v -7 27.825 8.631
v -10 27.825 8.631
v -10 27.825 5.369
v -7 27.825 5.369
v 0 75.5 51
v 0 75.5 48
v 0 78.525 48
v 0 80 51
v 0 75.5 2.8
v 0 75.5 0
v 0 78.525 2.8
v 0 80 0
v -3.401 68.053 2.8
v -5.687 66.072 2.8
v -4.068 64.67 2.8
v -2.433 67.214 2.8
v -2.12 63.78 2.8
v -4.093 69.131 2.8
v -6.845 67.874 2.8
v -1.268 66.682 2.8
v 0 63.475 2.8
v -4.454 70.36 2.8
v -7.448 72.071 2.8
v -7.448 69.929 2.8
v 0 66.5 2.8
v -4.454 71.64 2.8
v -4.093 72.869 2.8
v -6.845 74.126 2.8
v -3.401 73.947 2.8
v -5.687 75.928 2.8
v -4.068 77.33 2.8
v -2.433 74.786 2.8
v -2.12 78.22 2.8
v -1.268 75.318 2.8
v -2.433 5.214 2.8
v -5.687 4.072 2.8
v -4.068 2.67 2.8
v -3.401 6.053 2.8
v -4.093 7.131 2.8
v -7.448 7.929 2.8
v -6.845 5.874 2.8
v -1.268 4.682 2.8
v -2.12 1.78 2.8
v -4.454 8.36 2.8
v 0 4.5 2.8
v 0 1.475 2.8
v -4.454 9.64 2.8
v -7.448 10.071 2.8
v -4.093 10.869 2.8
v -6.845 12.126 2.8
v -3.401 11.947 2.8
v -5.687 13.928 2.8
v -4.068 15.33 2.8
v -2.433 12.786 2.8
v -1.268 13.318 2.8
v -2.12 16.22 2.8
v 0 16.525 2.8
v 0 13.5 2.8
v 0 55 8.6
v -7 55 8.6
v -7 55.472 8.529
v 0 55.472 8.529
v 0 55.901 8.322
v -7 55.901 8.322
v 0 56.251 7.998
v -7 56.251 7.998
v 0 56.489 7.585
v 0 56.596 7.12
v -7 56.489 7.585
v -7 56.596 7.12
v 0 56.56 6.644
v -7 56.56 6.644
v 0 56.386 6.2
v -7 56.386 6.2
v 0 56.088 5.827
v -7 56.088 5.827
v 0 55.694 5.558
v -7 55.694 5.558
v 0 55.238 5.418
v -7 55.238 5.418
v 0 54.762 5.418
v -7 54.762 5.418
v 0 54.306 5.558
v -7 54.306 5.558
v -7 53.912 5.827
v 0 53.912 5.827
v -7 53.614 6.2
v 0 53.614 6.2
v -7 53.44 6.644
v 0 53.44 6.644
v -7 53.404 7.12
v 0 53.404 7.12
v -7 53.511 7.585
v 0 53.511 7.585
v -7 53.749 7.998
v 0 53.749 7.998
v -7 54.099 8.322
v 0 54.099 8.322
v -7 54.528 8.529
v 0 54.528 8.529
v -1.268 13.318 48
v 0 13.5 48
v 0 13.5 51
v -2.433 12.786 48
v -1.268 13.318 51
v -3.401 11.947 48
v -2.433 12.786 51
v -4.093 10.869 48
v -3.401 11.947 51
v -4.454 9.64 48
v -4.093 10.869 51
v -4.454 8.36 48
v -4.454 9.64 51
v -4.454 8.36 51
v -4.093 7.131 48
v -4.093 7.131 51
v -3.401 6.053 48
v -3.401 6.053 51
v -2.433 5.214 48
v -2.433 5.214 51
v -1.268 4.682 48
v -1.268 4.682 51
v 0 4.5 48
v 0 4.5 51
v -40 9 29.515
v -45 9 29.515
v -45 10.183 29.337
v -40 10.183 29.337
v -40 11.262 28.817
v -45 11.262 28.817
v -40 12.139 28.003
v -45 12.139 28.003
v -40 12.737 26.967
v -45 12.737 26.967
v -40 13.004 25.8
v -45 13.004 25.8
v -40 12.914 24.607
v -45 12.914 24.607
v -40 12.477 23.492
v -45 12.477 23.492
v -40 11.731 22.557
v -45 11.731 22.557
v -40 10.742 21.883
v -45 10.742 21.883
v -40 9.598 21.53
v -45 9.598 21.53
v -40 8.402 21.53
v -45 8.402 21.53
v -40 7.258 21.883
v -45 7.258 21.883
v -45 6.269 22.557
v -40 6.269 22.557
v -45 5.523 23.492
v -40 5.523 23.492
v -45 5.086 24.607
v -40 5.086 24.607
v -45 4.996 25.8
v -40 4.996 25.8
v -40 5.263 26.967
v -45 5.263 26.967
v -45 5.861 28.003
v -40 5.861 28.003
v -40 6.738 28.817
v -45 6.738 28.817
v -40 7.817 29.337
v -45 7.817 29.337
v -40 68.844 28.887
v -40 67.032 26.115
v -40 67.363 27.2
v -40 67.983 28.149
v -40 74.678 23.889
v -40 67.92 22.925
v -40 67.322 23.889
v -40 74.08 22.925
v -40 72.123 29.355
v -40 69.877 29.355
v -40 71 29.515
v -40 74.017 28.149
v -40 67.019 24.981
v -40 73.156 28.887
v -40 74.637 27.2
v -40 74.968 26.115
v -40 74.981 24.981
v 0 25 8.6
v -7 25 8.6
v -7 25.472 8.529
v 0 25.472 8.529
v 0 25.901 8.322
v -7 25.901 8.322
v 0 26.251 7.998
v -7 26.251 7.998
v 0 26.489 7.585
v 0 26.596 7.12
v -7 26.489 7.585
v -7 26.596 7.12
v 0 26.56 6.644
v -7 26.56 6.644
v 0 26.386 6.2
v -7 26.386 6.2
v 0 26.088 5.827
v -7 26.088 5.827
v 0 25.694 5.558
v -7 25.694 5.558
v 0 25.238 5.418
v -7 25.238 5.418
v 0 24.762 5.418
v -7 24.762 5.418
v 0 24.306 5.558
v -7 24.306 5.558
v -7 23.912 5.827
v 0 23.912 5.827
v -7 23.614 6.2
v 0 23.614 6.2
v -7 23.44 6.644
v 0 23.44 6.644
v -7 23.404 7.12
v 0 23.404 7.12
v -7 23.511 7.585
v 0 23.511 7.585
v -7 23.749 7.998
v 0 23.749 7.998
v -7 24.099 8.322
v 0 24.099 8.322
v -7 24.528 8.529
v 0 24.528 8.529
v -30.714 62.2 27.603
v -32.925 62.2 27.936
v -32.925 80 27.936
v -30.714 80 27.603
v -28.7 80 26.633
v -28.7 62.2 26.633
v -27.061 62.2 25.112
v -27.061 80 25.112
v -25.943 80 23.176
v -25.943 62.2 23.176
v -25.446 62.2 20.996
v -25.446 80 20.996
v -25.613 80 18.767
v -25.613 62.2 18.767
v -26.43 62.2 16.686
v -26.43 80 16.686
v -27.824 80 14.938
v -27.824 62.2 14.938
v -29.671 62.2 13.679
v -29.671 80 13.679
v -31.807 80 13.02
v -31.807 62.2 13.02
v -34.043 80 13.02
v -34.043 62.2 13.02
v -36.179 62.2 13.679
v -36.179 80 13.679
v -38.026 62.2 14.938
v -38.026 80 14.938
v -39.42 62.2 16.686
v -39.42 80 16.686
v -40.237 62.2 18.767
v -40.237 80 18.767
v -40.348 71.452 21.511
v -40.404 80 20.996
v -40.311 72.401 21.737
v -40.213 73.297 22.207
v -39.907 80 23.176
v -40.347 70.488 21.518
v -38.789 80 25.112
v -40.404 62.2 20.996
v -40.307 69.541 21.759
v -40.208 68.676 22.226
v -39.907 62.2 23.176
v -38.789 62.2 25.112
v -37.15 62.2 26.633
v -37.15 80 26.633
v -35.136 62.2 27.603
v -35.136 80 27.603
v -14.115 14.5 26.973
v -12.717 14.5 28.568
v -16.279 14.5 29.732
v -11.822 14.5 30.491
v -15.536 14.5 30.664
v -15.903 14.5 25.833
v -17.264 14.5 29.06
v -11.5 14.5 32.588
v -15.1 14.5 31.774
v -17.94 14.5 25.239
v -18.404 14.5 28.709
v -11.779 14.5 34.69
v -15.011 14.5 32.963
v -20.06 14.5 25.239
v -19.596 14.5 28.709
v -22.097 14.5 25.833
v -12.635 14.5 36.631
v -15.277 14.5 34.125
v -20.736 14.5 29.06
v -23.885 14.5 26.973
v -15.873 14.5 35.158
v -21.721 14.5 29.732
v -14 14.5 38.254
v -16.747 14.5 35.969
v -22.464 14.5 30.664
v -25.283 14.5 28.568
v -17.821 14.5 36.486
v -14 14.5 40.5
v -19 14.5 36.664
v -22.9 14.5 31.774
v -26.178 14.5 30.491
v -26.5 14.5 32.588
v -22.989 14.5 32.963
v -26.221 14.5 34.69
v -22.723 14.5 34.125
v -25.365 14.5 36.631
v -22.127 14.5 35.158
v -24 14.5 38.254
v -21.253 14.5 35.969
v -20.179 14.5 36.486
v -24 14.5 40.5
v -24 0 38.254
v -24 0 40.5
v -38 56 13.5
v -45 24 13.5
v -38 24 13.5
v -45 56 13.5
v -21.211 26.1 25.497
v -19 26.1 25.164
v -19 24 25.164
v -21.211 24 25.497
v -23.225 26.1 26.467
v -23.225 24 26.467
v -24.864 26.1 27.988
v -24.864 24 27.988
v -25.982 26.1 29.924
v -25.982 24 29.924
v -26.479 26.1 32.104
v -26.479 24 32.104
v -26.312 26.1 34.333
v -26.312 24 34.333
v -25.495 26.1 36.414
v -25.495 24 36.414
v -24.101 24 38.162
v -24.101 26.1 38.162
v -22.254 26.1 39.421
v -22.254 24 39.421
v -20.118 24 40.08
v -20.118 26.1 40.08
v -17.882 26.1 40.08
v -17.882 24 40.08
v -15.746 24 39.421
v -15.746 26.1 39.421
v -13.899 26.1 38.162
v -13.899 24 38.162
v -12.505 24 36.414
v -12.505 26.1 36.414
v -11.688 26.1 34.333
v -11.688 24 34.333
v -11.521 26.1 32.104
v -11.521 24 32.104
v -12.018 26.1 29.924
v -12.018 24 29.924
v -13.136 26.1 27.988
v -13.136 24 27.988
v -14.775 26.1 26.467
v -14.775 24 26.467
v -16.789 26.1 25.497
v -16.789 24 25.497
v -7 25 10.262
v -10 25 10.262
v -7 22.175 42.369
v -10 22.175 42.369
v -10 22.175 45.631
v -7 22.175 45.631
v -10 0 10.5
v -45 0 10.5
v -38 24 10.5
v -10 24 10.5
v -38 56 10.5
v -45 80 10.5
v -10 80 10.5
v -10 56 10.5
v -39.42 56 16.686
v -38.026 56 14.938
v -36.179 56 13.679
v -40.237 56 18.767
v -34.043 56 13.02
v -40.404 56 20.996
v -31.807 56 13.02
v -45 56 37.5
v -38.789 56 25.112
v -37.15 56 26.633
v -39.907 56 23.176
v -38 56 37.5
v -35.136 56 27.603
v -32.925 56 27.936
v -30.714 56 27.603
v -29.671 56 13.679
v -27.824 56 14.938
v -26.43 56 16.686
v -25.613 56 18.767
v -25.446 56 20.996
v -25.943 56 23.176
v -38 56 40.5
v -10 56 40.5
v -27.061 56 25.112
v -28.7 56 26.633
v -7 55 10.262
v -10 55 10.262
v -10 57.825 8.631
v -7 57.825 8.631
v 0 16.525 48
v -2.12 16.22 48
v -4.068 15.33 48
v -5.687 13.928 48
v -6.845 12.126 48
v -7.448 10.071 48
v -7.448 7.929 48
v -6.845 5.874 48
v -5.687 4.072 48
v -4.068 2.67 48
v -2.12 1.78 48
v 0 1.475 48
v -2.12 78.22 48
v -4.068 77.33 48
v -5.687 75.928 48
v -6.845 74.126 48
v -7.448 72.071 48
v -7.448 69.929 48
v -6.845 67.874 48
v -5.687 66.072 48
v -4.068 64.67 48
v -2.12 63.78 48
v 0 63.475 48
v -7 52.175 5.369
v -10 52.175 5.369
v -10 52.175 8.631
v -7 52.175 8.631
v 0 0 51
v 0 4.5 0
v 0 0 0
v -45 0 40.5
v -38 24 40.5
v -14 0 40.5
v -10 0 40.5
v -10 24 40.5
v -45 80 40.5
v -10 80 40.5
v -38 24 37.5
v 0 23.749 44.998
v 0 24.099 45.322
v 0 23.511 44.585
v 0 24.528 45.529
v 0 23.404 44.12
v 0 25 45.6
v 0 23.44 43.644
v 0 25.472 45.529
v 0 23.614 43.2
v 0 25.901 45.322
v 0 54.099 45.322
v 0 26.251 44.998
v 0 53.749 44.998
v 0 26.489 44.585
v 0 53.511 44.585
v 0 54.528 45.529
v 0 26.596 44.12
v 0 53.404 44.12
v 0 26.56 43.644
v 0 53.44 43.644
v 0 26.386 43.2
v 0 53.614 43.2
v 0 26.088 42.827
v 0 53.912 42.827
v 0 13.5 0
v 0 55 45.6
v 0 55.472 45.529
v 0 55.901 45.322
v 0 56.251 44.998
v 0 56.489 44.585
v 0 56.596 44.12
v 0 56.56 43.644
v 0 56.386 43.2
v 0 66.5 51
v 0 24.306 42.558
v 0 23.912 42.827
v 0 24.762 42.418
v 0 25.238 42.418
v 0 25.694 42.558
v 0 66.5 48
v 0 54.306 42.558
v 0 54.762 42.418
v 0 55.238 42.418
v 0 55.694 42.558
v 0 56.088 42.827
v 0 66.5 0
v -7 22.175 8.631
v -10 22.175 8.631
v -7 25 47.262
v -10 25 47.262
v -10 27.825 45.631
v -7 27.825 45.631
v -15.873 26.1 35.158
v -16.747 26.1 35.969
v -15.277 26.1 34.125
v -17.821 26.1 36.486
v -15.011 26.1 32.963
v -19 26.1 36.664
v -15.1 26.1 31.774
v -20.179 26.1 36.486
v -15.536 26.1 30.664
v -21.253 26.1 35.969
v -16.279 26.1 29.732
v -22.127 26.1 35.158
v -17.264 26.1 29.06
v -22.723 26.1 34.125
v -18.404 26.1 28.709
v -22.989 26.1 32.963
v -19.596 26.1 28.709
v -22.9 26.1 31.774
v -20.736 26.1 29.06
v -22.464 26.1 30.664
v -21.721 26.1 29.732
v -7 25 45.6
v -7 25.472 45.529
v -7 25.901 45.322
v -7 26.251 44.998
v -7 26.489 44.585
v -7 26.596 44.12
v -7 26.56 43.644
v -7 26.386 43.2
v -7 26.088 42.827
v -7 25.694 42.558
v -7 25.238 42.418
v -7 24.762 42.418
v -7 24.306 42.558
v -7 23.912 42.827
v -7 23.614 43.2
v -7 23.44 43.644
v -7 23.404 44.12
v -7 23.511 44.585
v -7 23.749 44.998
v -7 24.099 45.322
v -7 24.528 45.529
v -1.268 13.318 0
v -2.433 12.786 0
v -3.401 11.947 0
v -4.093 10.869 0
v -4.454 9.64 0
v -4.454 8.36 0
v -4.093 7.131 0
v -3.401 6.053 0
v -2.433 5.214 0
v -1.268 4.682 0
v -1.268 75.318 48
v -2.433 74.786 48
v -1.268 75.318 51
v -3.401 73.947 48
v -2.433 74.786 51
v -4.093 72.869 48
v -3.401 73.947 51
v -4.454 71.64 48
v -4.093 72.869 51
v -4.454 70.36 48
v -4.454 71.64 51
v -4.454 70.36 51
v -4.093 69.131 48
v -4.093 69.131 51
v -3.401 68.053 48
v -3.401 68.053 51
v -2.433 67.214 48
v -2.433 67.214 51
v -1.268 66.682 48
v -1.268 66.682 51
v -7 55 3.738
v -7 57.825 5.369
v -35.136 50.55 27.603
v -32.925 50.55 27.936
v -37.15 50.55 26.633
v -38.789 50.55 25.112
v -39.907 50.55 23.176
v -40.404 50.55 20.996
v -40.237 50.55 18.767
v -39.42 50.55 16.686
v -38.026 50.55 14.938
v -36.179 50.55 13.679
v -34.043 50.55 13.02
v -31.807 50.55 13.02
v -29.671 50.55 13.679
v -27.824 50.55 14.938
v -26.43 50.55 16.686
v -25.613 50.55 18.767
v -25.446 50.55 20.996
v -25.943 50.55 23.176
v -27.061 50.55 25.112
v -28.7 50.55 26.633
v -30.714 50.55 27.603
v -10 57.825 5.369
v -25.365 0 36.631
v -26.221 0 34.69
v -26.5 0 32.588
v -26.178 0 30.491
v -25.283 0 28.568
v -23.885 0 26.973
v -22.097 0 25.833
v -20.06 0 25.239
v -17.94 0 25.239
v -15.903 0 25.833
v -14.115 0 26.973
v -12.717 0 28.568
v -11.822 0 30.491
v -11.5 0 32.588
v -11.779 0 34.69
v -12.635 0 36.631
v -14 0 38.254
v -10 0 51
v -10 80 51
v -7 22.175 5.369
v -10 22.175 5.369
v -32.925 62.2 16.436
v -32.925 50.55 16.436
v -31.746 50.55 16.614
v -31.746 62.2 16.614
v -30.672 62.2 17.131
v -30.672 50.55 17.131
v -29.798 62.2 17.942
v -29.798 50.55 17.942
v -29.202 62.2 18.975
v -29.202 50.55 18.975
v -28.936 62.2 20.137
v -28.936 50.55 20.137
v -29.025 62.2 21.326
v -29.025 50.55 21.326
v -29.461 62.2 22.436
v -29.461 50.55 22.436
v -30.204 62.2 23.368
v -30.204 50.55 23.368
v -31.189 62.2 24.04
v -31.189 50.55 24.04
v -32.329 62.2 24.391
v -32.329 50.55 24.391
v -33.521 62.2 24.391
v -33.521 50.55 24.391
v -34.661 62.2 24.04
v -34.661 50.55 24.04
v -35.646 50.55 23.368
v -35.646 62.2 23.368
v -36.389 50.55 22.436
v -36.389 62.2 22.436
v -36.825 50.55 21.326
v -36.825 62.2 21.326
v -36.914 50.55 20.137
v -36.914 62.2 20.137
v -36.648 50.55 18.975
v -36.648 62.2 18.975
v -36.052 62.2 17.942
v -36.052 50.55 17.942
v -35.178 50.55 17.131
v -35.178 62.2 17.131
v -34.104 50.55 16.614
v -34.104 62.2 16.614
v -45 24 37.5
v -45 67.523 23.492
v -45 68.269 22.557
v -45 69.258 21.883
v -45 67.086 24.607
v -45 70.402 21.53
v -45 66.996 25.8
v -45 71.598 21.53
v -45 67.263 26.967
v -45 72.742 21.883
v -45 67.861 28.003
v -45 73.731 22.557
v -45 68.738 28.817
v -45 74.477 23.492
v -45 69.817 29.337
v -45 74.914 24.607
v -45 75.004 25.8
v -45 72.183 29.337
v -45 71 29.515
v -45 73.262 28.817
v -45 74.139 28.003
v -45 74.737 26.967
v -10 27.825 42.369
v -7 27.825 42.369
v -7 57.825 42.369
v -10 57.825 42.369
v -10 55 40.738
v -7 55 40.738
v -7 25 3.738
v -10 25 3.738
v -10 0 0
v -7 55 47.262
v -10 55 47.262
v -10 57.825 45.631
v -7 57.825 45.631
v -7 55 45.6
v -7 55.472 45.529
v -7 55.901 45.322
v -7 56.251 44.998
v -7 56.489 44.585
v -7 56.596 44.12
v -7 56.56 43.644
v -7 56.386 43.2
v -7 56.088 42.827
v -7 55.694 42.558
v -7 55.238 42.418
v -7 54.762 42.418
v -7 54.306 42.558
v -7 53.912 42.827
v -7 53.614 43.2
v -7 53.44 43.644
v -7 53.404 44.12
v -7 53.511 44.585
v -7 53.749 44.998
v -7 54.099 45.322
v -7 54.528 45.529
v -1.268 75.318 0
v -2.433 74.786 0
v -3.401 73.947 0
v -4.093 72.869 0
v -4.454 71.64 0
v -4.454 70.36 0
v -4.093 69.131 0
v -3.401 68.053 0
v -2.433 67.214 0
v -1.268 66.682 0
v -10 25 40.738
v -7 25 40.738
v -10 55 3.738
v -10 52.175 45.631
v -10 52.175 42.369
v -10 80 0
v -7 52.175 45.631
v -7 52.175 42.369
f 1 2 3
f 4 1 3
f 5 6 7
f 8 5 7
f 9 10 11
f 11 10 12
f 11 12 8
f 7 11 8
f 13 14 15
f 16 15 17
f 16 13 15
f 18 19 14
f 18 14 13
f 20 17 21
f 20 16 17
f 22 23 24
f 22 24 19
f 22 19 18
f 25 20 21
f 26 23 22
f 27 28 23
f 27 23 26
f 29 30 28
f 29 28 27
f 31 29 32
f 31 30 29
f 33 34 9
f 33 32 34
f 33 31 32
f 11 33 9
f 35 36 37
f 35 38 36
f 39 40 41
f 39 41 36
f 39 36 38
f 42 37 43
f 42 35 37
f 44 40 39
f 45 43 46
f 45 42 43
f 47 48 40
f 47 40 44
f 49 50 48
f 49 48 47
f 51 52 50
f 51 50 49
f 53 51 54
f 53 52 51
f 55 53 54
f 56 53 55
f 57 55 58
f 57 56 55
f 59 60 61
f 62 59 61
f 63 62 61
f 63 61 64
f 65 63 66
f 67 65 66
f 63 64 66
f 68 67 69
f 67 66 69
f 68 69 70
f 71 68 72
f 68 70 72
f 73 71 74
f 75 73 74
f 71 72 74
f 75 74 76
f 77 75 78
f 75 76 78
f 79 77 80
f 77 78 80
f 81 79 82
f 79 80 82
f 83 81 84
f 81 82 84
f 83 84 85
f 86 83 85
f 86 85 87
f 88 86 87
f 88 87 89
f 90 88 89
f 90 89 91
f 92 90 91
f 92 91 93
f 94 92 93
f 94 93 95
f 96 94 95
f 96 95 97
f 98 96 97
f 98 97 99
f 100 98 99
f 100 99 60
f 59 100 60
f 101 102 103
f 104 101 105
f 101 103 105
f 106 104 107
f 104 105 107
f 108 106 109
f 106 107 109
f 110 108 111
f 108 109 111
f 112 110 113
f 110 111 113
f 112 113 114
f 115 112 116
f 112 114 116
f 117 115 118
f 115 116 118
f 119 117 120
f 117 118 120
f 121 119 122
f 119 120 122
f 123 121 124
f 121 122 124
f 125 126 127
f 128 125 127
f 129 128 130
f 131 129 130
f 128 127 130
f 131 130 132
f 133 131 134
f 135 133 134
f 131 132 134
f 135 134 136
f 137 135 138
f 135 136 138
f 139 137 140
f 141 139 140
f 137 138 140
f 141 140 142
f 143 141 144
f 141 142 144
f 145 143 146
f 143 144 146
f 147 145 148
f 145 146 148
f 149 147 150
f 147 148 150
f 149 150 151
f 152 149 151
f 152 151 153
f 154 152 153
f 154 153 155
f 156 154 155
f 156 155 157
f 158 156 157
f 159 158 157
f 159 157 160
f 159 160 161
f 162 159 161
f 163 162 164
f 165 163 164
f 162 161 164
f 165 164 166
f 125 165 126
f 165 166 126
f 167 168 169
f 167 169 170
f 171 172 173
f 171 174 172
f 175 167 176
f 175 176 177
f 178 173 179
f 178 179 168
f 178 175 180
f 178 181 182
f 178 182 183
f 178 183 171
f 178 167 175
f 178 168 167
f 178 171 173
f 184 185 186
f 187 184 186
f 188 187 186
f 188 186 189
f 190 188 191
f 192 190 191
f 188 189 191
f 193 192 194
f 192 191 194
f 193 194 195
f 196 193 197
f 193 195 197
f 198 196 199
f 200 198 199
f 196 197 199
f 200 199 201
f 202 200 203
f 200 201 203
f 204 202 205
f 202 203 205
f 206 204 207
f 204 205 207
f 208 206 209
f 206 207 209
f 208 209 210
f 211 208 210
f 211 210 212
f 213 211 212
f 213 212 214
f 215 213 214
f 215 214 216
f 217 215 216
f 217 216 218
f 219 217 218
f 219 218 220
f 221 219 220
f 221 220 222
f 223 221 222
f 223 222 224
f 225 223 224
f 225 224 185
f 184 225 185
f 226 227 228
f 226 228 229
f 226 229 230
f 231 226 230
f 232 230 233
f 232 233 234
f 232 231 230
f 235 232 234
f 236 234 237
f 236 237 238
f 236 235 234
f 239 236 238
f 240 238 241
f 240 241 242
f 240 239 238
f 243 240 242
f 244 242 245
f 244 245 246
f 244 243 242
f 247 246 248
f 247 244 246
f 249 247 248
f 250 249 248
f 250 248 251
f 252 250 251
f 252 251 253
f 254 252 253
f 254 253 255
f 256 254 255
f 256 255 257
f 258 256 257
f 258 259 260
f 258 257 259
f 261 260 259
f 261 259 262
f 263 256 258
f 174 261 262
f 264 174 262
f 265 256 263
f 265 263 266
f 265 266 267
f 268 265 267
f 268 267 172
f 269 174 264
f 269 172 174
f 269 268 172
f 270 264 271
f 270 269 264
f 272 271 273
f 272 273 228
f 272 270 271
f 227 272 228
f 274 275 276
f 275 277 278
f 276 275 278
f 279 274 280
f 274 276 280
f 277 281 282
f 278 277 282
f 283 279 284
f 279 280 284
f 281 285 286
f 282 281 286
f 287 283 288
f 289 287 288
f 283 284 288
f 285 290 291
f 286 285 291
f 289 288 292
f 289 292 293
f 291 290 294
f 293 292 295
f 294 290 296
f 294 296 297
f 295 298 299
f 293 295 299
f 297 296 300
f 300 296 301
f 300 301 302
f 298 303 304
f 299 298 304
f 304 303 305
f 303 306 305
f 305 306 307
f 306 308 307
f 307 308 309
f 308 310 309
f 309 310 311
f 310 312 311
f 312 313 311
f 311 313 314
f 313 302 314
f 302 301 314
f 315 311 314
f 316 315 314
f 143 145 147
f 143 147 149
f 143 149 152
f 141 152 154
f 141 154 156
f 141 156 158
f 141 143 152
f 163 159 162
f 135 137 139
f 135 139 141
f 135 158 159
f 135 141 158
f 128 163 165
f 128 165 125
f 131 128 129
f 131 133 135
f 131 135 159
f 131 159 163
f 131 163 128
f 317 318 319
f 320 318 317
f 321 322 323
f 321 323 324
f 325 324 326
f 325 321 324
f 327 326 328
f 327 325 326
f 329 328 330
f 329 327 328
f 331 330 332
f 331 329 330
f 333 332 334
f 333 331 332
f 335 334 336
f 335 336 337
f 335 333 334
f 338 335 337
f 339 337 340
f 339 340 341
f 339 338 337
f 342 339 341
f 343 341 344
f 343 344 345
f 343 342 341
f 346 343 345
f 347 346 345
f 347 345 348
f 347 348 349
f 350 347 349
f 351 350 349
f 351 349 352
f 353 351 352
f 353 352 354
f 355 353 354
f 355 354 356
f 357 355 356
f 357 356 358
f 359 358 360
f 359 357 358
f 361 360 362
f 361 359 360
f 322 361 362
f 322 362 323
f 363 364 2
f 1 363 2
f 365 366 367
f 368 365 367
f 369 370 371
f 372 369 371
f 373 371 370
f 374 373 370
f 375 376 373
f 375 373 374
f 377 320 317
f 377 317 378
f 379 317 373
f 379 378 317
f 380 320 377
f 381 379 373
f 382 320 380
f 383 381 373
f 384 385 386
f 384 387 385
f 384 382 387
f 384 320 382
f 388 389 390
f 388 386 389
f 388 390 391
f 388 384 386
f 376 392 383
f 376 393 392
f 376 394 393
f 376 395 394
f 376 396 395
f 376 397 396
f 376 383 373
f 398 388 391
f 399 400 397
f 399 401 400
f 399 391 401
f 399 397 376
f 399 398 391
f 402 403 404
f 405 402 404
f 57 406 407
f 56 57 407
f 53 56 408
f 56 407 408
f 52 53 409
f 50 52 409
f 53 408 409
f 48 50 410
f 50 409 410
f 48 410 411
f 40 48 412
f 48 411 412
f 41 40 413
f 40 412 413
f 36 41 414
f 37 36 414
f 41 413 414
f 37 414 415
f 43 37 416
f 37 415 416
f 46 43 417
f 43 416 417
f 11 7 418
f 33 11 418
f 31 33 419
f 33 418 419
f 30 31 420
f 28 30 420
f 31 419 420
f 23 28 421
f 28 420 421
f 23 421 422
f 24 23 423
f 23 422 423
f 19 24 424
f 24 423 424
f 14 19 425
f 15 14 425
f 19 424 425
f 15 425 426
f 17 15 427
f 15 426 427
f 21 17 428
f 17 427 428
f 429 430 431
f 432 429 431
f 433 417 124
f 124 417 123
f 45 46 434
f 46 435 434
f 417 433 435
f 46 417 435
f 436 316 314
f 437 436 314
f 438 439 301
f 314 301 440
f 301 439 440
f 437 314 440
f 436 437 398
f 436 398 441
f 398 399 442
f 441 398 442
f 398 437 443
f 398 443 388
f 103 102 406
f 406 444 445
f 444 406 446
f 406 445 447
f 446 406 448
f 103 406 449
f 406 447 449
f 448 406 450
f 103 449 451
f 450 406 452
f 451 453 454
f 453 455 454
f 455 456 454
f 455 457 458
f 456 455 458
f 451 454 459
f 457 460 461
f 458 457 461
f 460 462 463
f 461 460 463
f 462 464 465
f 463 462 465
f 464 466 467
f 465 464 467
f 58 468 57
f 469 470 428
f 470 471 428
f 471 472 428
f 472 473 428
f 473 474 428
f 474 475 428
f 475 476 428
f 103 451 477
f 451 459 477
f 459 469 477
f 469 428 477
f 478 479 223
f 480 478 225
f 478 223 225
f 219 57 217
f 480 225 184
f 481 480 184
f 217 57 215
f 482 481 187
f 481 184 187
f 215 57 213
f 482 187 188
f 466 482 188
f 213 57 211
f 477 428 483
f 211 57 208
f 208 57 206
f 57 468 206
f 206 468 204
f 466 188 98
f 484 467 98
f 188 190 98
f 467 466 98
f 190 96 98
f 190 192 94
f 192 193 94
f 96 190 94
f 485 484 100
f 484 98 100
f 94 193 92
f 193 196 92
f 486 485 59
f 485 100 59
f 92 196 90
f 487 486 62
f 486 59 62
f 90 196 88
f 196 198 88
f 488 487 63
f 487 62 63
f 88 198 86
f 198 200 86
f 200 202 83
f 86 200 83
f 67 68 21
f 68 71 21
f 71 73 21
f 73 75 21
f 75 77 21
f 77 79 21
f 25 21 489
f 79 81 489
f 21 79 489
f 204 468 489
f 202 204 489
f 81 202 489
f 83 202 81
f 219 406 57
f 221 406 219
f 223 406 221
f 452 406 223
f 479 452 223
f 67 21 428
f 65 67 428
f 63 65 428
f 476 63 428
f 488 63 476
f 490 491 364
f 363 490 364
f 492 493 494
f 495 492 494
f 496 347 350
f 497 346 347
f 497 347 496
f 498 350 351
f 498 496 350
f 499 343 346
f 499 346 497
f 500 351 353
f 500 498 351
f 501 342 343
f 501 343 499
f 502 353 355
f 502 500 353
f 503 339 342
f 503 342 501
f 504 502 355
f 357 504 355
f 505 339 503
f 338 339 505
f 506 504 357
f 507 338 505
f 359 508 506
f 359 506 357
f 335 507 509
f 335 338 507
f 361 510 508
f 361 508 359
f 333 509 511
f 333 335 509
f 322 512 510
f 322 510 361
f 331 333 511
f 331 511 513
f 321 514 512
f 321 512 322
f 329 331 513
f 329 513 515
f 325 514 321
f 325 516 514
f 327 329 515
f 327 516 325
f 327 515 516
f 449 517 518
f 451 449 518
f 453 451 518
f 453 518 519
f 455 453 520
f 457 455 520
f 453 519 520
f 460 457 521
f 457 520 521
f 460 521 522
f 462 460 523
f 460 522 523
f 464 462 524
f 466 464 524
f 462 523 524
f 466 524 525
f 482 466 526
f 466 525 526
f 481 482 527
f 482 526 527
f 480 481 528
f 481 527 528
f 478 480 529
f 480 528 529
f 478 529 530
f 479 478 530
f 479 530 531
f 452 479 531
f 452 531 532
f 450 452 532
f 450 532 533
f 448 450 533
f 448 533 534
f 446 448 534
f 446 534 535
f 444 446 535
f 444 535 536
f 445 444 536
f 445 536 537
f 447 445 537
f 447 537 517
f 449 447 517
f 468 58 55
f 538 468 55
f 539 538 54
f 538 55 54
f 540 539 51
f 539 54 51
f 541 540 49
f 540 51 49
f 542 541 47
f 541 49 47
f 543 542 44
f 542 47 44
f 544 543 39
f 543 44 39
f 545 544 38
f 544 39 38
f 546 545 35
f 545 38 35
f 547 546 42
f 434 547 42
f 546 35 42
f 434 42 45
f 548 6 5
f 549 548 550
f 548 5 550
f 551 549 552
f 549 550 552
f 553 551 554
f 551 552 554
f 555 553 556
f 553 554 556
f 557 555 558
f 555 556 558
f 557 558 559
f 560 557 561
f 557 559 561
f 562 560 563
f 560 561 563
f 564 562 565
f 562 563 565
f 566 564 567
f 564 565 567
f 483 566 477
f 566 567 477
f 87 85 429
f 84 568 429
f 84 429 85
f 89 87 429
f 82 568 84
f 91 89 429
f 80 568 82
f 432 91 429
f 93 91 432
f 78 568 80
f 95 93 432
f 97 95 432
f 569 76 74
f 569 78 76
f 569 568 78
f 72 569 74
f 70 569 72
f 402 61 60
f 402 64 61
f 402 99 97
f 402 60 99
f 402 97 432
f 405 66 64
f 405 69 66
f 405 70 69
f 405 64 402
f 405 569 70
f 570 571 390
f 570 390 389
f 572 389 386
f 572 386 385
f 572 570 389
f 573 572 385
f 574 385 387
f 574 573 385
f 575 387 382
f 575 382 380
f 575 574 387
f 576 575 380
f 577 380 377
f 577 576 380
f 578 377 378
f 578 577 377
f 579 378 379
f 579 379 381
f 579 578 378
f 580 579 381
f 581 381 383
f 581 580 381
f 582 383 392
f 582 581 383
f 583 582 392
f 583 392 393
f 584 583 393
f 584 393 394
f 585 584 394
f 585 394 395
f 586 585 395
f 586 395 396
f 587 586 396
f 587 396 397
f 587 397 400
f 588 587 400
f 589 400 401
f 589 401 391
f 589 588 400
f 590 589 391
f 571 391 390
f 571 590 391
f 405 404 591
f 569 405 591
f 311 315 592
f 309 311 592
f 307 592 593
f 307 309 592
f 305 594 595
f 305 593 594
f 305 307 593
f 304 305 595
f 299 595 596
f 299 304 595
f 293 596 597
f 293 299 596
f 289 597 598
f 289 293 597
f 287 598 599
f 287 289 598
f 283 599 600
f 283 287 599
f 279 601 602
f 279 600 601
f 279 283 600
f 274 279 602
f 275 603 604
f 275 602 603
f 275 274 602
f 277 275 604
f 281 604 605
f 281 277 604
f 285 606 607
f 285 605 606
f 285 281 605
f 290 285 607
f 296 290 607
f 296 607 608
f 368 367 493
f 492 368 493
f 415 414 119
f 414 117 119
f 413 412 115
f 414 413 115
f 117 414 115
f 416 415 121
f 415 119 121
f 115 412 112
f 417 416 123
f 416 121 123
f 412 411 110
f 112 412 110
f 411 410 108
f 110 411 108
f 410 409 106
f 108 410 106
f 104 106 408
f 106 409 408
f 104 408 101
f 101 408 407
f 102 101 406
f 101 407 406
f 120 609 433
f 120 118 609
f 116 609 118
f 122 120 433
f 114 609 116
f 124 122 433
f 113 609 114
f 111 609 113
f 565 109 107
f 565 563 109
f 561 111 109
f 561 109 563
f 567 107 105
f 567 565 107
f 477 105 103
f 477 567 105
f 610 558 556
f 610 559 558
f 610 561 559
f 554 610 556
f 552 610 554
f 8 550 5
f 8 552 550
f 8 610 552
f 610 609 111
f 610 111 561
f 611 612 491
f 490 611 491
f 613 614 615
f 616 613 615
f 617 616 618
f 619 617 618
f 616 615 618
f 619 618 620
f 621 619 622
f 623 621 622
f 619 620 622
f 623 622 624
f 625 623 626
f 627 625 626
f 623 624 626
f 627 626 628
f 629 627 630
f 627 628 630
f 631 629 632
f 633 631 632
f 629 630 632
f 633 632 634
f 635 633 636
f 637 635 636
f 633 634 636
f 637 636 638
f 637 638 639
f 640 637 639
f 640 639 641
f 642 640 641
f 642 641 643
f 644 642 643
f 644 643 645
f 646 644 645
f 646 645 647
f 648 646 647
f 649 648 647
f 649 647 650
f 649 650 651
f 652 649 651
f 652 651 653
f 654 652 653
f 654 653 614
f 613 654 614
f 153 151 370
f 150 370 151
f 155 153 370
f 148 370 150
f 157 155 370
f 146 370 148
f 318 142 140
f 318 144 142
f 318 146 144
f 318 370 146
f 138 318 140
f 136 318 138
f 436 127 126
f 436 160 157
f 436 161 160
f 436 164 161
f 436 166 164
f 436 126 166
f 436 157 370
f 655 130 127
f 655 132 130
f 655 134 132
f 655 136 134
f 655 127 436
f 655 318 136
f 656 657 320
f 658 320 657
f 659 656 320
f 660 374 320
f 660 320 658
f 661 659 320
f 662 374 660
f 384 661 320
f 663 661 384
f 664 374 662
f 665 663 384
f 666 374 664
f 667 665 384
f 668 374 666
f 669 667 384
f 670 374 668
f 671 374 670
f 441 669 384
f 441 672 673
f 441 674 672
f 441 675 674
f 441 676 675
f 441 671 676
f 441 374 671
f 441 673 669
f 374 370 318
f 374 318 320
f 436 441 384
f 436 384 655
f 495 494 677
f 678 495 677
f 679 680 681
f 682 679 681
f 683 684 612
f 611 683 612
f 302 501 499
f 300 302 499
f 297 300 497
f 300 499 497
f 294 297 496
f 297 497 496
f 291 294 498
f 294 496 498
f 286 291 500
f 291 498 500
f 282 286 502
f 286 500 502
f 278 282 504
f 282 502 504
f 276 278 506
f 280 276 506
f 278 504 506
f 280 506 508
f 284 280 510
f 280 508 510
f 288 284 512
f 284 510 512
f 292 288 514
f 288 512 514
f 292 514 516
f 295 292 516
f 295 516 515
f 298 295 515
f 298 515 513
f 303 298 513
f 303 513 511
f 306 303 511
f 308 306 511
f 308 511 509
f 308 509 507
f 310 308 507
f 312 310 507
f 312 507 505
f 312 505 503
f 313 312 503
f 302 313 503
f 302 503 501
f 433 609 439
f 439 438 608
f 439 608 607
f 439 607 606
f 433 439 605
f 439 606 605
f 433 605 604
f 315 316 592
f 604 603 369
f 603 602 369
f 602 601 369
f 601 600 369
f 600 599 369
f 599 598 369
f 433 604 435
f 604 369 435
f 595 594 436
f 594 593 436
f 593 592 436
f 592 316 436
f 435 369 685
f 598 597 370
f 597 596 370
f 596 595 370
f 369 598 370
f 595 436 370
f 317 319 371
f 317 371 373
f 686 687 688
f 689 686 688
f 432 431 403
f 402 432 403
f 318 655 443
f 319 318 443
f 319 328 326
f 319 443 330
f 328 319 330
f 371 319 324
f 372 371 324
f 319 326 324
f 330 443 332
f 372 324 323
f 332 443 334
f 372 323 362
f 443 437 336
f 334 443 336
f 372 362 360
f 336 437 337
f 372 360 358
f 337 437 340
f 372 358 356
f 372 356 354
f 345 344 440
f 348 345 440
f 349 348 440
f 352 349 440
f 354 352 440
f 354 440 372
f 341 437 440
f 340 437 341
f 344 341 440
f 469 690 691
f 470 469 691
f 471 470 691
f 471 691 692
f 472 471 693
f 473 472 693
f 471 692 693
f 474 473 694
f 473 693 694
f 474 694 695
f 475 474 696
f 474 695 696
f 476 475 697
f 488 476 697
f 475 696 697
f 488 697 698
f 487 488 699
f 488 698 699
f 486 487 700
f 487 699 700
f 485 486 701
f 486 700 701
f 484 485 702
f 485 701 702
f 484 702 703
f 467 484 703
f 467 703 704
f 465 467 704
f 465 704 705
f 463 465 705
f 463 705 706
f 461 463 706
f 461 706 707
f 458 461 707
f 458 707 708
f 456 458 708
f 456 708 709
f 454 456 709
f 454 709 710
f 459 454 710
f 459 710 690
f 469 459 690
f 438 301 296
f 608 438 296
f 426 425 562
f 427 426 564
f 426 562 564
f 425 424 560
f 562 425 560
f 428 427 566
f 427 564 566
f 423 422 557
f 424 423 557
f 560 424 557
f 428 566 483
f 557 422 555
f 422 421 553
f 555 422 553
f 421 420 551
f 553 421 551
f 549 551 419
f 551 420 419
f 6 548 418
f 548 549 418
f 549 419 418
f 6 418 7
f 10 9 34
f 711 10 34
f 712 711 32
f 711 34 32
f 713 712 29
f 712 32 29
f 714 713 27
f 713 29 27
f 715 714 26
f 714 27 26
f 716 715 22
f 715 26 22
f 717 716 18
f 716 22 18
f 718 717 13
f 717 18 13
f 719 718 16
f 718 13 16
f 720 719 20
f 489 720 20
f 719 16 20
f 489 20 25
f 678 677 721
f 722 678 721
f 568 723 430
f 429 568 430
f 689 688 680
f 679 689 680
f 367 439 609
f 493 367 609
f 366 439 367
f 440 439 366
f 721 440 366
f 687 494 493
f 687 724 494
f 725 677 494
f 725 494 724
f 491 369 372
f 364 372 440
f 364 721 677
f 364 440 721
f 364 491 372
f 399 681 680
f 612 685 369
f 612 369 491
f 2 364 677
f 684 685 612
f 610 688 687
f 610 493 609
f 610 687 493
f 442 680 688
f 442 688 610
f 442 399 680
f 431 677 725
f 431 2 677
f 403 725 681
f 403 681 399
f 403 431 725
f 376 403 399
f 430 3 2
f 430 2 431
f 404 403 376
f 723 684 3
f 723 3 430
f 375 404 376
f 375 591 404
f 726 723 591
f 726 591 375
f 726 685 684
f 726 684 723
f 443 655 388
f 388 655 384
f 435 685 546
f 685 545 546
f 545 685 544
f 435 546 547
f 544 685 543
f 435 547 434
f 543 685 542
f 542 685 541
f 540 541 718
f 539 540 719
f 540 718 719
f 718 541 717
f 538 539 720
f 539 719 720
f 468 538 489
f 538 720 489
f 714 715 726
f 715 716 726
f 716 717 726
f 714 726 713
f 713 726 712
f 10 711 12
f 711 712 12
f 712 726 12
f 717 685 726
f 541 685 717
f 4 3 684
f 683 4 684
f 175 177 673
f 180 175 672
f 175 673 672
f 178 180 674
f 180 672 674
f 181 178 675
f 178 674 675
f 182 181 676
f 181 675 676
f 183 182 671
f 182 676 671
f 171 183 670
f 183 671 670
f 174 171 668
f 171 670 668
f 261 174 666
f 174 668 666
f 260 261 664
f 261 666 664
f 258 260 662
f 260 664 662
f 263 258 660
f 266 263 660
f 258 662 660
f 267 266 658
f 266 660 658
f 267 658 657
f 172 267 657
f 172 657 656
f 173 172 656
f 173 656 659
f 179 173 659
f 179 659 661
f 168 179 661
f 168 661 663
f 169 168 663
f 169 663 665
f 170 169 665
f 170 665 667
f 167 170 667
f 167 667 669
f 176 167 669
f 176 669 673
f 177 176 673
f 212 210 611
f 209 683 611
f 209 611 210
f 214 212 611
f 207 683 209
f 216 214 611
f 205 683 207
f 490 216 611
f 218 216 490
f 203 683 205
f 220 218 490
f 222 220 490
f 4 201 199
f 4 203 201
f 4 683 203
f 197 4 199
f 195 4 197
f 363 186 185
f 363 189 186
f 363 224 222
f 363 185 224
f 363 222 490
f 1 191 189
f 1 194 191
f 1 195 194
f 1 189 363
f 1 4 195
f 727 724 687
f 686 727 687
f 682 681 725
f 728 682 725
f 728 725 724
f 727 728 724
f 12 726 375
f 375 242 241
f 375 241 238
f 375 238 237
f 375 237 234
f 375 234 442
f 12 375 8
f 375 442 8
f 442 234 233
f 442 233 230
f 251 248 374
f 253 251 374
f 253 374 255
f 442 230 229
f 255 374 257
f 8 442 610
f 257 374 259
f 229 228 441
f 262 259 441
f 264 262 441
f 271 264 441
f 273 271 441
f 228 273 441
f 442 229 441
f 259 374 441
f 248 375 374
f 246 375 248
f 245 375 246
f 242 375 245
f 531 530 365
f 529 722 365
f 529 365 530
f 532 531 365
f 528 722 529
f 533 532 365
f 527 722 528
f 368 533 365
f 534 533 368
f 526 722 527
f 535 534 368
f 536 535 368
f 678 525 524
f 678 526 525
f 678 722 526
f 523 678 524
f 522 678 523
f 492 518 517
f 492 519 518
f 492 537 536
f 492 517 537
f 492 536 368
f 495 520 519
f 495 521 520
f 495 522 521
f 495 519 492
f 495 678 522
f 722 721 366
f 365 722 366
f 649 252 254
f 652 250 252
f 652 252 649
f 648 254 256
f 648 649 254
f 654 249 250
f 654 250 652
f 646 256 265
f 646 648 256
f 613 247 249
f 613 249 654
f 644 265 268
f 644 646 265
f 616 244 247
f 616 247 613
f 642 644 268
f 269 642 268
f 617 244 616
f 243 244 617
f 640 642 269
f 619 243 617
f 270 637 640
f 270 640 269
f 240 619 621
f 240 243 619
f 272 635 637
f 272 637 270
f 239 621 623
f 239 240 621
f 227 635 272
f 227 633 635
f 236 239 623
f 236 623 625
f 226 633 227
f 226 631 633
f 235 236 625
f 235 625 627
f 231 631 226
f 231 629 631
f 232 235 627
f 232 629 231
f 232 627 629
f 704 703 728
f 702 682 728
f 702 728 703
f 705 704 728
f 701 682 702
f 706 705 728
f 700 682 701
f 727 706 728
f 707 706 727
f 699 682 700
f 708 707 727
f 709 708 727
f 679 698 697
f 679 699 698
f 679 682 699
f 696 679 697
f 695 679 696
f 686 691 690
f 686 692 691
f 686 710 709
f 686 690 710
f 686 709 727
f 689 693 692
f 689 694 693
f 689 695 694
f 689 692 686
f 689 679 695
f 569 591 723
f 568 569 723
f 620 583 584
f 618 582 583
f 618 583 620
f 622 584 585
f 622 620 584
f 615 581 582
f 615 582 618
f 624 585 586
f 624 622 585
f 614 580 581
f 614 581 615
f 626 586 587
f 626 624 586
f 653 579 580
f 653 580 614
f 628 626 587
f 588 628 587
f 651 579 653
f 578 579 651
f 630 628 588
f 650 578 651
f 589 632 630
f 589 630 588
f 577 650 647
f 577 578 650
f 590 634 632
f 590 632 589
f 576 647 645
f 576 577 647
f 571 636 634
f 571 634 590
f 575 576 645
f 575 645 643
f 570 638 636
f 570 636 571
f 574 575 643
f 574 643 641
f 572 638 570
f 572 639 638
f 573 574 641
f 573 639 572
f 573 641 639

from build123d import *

# Parameters (mm, degrees)
SKETCH1_W           = 10
SKETCH1_H           = 80
BOSS_EXTRUDE1_DEPTH = 51
SKETCH2_R           = 7.525
CUT_EXTRUDE1_DEPTH  = 45.2
SKETCH3_R           = 4.5
CUT_EXTRUDE2_DEPTH  = 96.399161422
SKETCH4_W           = 30
SKETCH4_H           = 80
BOSS_EXTRUDE2_DEPTH = 35
SKETCH6_R           = 4.015
CUT_EXTRUDE3_DEPTH  = 5
SKETCH7_W           = 24
SKETCH7_H           = 32
CUT_EXTRUDE4_DEPTH  = 35
SKETCH8_W           = 28
SKETCH8_H           = 32
CUT_EXTRUDE5_DEPTH  = 101.325719534
CUT_EXTRUDE9_DEPTH  = 3
SKETCH15_R          = 1.6
CUT_EXTRUDE10_DEPTH = 103.200782776
SKETCH16_R          = 4
CUT_EXTRUDE11_DEPTH = 106.004761797
SKETCH19_R          = 4
CUT_EXTRUDE13_DEPTH = 106.004761797
BOSS_EXTRUDE3_START = 5.45
SKETCH20_R          = 7.5
SKETCH20_R_2        = 4
BOSS_EXTRUDE3_DEPTH = 5.45
BOSS_EXTRUDE4_START = 2.1
SKETCH21_R          = 7.5
SKETCH21_R_2        = 4
BOSS_EXTRUDE4_DEPTH = 2.1
BOSS_EXTRUDE5_START = -24
SKETCH22_R          = 4
BOSS_EXTRUDE5_DEPTH = 24
BOSS_EXTRUDE6_START = -24
SKETCH23_R          = 4
BOSS_EXTRUDE6_DEPTH = 24
CUT_EXTRUDE14_START = -17.8
SKETCH24_R          = 7.5
CUT_EXTRUDE14_DEPTH = 17.8
CUT_EXTRUDE15_START = -14.5
SKETCH25_R          = 7.5
CUT_EXTRUDE15_DEPTH = 14.5
CUT_EXTRUDE16_START = -14.5
CUT_EXTRUDE16_DEPTH = 14.5


with BuildPart() as part:
    # Sketch1 → Boss-Extrude1 (new body)
    with BuildSketch(Plane.XY):
        with Locations((-5, 40)):
            Rectangle(SKETCH1_W, SKETCH1_H)
    extrude(amount=BOSS_EXTRUDE1_DEPTH)

    # Sketch2 → Cut-Extrude1 (cut)
    with BuildSketch(Plane.XY.offset(48)):
        with Locations((0, 71)):
            Circle(SKETCH2_R)
        with Locations((0, 9)):
            Circle(SKETCH2_R)
    extrude(amount=-CUT_EXTRUDE1_DEPTH, mode=Mode.SUBTRACT)

    # Sketch3 → Cut-Extrude2 (cut, through all)
    with BuildSketch(Plane.XY.offset(51)):
        with Locations((0, 71)):
            Circle(SKETCH3_R)
        with Locations((0, 9)):
            Circle(SKETCH3_R)
    extrude(amount=-CUT_EXTRUDE2_DEPTH, mode=Mode.SUBTRACT)

    # Sketch4 → Boss-Extrude2 (add)
    with BuildSketch(Plane.ZY.offset(10)):
        with Locations((25.5, 40)):
            Rectangle(SKETCH4_W, SKETCH4_H)
    extrude(amount=BOSS_EXTRUDE2_DEPTH)

    # Sketch6 → Cut-Extrude3 (cut)
    with BuildSketch(Plane.ZY.offset(45)):
        with Locations((25.5, 71)):
            Circle(SKETCH6_R)
        with Locations((25.5, 9)):
            Circle(SKETCH6_R)
    extrude(amount=-CUT_EXTRUDE3_DEPTH, mode=Mode.SUBTRACT)

    # Sketch7 → Cut-Extrude4 (cut)
    with BuildSketch(Plane.ZY.offset(45)):
        with Locations((25.5, 40)):
            Rectangle(SKETCH7_W, SKETCH7_H)
    extrude(amount=-CUT_EXTRUDE4_DEPTH, mode=Mode.SUBTRACT)

    # Sketch8 → Cut-Extrude5 (cut, through all)
    with BuildSketch(Plane.XY.offset(40.5)):
        with Locations((-24, 40)):
            Rectangle(SKETCH8_W, SKETCH8_H)
    extrude(amount=-CUT_EXTRUDE5_DEPTH, mode=Mode.SUBTRACT)

    # Sketch14 → Cut-Extrude9 (cut)
    with BuildSketch(Plane.ZY.offset(10)):
        Polygon((47.262029021, 55), (45.63101451, 57.825), (42.36898549, 57.825), (40.737970979, 55), (42.36898549, 52.175), (45.63101451, 52.175), align=None)
        Polygon((10.262029021, 55), (8.63101451, 57.825), (5.36898549, 57.825), (3.737970979, 55), (5.36898549, 52.175), (8.63101451, 52.175), align=None)
        Polygon((10.262029021, 25), (8.63101451, 27.825), (5.36898549, 27.825), (3.737970979, 25), (5.36898549, 22.175), (8.63101451, 22.175), align=None)
        Polygon((47.262029021, 25), (45.63101451, 27.825), (42.36898549, 27.825), (40.737970979, 25), (42.36898549, 22.175), (45.63101451, 22.175), align=None)
    extrude(amount=-CUT_EXTRUDE9_DEPTH, mode=Mode.SUBTRACT)

    # Sketch15 → Cut-Extrude10 (cut, through all)
    with BuildSketch(Plane.ZY.offset(7)):
        with Locations((44, 55)):
            Circle(SKETCH15_R)
        with Locations((7, 55)):
            Circle(SKETCH15_R)
        with Locations((7, 25)):
            Circle(SKETCH15_R)
        with Locations((44, 25)):
            Circle(SKETCH15_R)
    extrude(amount=-CUT_EXTRUDE10_DEPTH, mode=Mode.SUBTRACT)

    # Sketch16 → Cut-Extrude11 (cut, through all)
    with BuildSketch(Plane(origin=(0, 80, 0), x_dir=(1, 0, 0), z_dir=(0, 1, 0))):
        with Locations(Location((-19, -32.664, 0), (0, 0, 270))):
            Circle(SKETCH16_R)
    extrude(amount=-CUT_EXTRUDE11_DEPTH, mode=Mode.SUBTRACT)

    # Sketch19 → Cut-Extrude13 (cut, through all)
    with BuildSketch(Plane.XZ):
        with Locations(Location((-32.925, 20.436, 0), (0, 0, 270))):
            Circle(SKETCH19_R)
    extrude(amount=-CUT_EXTRUDE13_DEPTH, mode=Mode.SUBTRACT)

    # Sketch20 → Boss-Extrude3 (add)
    with BuildSketch(Plane.XZ.offset(-56).offset(BOSS_EXTRUDE3_START)):
        with Locations(Location((-32.925, 20.436, 0), (0, 0, 90))):
            Circle(SKETCH20_R)
        with Locations(Location((-32.925, 20.436, 0), (0, 0, 270))):
            Circle(SKETCH20_R_2, mode=Mode.SUBTRACT)
    extrude(amount=-BOSS_EXTRUDE3_DEPTH)

    # Sketch21 → Boss-Extrude4 (add)
    with BuildSketch(Plane(origin=(0, 24, 0), x_dir=(1, 0, 0), z_dir=(0, 1, 0)).offset(BOSS_EXTRUDE4_START)):
        with Locations(Location((-19, -32.664, 0), (0, 0, 90))):
            Circle(SKETCH21_R)
        with Locations(Location((-19, -32.664, 0), (0, 0, 270))):
            Circle(SKETCH21_R_2, mode=Mode.SUBTRACT)
    extrude(amount=-BOSS_EXTRUDE4_DEPTH)

    # Sketch22 → Boss-Extrude5 (add)
    with BuildSketch(Plane.XZ.offset(-56).offset(BOSS_EXTRUDE5_START)):
        with Locations(Location((-19, 32.664, 0), (0, 0, 90))):
            Circle(SKETCH22_R)
    extrude(amount=BOSS_EXTRUDE5_DEPTH)

    # Sketch23 → Boss-Extrude6 (add)
    with BuildSketch(Plane(origin=(0, 24, 0), x_dir=(1, 0, 0), z_dir=(0, 1, 0)).offset(BOSS_EXTRUDE6_START)):
        with Locations(Location((-32.925, -20.436, 0), (0, 0, 90))):
            Circle(SKETCH23_R)
    extrude(amount=BOSS_EXTRUDE6_DEPTH)

    # Sketch24 → Cut-Extrude14 (cut)
    with BuildSketch(Plane(origin=(0, 80, 0), x_dir=(1, 0, 0), z_dir=(0, 1, 0)).offset(CUT_EXTRUDE14_START)):
        with Locations(Location((-32.925, -20.436, 0), (0, 0, 270))):
            Circle(SKETCH24_R)
    extrude(amount=CUT_EXTRUDE14_DEPTH, mode=Mode.SUBTRACT)

    # Sketch25 → Cut-Extrude15 (cut)
    with BuildSketch(Plane.XZ.offset(CUT_EXTRUDE15_START)):
        with Locations(Location((-19, 32.664, 0), (0, 0, 270))):
            Circle(SKETCH25_R)
    extrude(amount=CUT_EXTRUDE15_DEPTH, mode=Mode.SUBTRACT)

    # Sketch26 → Cut-Extrude16 (cut)
    with BuildSketch(Plane.XZ.offset(CUT_EXTRUDE16_START)):
        with BuildLine():
            Line((-14, 40.5), (-14, 38.254169944))
            ThreePointArc((-14, 38.254169944), (-19, 40.164), (-24, 38.254169944))
            Line((-24, 38.254169944), (-24, 40.5))
            Line((-24, 40.5), (-14, 40.5))
        make_face()
    extrude(amount=CUT_EXTRUDE16_DEPTH, mode=Mode.SUBTRACT)


solid = part.part
